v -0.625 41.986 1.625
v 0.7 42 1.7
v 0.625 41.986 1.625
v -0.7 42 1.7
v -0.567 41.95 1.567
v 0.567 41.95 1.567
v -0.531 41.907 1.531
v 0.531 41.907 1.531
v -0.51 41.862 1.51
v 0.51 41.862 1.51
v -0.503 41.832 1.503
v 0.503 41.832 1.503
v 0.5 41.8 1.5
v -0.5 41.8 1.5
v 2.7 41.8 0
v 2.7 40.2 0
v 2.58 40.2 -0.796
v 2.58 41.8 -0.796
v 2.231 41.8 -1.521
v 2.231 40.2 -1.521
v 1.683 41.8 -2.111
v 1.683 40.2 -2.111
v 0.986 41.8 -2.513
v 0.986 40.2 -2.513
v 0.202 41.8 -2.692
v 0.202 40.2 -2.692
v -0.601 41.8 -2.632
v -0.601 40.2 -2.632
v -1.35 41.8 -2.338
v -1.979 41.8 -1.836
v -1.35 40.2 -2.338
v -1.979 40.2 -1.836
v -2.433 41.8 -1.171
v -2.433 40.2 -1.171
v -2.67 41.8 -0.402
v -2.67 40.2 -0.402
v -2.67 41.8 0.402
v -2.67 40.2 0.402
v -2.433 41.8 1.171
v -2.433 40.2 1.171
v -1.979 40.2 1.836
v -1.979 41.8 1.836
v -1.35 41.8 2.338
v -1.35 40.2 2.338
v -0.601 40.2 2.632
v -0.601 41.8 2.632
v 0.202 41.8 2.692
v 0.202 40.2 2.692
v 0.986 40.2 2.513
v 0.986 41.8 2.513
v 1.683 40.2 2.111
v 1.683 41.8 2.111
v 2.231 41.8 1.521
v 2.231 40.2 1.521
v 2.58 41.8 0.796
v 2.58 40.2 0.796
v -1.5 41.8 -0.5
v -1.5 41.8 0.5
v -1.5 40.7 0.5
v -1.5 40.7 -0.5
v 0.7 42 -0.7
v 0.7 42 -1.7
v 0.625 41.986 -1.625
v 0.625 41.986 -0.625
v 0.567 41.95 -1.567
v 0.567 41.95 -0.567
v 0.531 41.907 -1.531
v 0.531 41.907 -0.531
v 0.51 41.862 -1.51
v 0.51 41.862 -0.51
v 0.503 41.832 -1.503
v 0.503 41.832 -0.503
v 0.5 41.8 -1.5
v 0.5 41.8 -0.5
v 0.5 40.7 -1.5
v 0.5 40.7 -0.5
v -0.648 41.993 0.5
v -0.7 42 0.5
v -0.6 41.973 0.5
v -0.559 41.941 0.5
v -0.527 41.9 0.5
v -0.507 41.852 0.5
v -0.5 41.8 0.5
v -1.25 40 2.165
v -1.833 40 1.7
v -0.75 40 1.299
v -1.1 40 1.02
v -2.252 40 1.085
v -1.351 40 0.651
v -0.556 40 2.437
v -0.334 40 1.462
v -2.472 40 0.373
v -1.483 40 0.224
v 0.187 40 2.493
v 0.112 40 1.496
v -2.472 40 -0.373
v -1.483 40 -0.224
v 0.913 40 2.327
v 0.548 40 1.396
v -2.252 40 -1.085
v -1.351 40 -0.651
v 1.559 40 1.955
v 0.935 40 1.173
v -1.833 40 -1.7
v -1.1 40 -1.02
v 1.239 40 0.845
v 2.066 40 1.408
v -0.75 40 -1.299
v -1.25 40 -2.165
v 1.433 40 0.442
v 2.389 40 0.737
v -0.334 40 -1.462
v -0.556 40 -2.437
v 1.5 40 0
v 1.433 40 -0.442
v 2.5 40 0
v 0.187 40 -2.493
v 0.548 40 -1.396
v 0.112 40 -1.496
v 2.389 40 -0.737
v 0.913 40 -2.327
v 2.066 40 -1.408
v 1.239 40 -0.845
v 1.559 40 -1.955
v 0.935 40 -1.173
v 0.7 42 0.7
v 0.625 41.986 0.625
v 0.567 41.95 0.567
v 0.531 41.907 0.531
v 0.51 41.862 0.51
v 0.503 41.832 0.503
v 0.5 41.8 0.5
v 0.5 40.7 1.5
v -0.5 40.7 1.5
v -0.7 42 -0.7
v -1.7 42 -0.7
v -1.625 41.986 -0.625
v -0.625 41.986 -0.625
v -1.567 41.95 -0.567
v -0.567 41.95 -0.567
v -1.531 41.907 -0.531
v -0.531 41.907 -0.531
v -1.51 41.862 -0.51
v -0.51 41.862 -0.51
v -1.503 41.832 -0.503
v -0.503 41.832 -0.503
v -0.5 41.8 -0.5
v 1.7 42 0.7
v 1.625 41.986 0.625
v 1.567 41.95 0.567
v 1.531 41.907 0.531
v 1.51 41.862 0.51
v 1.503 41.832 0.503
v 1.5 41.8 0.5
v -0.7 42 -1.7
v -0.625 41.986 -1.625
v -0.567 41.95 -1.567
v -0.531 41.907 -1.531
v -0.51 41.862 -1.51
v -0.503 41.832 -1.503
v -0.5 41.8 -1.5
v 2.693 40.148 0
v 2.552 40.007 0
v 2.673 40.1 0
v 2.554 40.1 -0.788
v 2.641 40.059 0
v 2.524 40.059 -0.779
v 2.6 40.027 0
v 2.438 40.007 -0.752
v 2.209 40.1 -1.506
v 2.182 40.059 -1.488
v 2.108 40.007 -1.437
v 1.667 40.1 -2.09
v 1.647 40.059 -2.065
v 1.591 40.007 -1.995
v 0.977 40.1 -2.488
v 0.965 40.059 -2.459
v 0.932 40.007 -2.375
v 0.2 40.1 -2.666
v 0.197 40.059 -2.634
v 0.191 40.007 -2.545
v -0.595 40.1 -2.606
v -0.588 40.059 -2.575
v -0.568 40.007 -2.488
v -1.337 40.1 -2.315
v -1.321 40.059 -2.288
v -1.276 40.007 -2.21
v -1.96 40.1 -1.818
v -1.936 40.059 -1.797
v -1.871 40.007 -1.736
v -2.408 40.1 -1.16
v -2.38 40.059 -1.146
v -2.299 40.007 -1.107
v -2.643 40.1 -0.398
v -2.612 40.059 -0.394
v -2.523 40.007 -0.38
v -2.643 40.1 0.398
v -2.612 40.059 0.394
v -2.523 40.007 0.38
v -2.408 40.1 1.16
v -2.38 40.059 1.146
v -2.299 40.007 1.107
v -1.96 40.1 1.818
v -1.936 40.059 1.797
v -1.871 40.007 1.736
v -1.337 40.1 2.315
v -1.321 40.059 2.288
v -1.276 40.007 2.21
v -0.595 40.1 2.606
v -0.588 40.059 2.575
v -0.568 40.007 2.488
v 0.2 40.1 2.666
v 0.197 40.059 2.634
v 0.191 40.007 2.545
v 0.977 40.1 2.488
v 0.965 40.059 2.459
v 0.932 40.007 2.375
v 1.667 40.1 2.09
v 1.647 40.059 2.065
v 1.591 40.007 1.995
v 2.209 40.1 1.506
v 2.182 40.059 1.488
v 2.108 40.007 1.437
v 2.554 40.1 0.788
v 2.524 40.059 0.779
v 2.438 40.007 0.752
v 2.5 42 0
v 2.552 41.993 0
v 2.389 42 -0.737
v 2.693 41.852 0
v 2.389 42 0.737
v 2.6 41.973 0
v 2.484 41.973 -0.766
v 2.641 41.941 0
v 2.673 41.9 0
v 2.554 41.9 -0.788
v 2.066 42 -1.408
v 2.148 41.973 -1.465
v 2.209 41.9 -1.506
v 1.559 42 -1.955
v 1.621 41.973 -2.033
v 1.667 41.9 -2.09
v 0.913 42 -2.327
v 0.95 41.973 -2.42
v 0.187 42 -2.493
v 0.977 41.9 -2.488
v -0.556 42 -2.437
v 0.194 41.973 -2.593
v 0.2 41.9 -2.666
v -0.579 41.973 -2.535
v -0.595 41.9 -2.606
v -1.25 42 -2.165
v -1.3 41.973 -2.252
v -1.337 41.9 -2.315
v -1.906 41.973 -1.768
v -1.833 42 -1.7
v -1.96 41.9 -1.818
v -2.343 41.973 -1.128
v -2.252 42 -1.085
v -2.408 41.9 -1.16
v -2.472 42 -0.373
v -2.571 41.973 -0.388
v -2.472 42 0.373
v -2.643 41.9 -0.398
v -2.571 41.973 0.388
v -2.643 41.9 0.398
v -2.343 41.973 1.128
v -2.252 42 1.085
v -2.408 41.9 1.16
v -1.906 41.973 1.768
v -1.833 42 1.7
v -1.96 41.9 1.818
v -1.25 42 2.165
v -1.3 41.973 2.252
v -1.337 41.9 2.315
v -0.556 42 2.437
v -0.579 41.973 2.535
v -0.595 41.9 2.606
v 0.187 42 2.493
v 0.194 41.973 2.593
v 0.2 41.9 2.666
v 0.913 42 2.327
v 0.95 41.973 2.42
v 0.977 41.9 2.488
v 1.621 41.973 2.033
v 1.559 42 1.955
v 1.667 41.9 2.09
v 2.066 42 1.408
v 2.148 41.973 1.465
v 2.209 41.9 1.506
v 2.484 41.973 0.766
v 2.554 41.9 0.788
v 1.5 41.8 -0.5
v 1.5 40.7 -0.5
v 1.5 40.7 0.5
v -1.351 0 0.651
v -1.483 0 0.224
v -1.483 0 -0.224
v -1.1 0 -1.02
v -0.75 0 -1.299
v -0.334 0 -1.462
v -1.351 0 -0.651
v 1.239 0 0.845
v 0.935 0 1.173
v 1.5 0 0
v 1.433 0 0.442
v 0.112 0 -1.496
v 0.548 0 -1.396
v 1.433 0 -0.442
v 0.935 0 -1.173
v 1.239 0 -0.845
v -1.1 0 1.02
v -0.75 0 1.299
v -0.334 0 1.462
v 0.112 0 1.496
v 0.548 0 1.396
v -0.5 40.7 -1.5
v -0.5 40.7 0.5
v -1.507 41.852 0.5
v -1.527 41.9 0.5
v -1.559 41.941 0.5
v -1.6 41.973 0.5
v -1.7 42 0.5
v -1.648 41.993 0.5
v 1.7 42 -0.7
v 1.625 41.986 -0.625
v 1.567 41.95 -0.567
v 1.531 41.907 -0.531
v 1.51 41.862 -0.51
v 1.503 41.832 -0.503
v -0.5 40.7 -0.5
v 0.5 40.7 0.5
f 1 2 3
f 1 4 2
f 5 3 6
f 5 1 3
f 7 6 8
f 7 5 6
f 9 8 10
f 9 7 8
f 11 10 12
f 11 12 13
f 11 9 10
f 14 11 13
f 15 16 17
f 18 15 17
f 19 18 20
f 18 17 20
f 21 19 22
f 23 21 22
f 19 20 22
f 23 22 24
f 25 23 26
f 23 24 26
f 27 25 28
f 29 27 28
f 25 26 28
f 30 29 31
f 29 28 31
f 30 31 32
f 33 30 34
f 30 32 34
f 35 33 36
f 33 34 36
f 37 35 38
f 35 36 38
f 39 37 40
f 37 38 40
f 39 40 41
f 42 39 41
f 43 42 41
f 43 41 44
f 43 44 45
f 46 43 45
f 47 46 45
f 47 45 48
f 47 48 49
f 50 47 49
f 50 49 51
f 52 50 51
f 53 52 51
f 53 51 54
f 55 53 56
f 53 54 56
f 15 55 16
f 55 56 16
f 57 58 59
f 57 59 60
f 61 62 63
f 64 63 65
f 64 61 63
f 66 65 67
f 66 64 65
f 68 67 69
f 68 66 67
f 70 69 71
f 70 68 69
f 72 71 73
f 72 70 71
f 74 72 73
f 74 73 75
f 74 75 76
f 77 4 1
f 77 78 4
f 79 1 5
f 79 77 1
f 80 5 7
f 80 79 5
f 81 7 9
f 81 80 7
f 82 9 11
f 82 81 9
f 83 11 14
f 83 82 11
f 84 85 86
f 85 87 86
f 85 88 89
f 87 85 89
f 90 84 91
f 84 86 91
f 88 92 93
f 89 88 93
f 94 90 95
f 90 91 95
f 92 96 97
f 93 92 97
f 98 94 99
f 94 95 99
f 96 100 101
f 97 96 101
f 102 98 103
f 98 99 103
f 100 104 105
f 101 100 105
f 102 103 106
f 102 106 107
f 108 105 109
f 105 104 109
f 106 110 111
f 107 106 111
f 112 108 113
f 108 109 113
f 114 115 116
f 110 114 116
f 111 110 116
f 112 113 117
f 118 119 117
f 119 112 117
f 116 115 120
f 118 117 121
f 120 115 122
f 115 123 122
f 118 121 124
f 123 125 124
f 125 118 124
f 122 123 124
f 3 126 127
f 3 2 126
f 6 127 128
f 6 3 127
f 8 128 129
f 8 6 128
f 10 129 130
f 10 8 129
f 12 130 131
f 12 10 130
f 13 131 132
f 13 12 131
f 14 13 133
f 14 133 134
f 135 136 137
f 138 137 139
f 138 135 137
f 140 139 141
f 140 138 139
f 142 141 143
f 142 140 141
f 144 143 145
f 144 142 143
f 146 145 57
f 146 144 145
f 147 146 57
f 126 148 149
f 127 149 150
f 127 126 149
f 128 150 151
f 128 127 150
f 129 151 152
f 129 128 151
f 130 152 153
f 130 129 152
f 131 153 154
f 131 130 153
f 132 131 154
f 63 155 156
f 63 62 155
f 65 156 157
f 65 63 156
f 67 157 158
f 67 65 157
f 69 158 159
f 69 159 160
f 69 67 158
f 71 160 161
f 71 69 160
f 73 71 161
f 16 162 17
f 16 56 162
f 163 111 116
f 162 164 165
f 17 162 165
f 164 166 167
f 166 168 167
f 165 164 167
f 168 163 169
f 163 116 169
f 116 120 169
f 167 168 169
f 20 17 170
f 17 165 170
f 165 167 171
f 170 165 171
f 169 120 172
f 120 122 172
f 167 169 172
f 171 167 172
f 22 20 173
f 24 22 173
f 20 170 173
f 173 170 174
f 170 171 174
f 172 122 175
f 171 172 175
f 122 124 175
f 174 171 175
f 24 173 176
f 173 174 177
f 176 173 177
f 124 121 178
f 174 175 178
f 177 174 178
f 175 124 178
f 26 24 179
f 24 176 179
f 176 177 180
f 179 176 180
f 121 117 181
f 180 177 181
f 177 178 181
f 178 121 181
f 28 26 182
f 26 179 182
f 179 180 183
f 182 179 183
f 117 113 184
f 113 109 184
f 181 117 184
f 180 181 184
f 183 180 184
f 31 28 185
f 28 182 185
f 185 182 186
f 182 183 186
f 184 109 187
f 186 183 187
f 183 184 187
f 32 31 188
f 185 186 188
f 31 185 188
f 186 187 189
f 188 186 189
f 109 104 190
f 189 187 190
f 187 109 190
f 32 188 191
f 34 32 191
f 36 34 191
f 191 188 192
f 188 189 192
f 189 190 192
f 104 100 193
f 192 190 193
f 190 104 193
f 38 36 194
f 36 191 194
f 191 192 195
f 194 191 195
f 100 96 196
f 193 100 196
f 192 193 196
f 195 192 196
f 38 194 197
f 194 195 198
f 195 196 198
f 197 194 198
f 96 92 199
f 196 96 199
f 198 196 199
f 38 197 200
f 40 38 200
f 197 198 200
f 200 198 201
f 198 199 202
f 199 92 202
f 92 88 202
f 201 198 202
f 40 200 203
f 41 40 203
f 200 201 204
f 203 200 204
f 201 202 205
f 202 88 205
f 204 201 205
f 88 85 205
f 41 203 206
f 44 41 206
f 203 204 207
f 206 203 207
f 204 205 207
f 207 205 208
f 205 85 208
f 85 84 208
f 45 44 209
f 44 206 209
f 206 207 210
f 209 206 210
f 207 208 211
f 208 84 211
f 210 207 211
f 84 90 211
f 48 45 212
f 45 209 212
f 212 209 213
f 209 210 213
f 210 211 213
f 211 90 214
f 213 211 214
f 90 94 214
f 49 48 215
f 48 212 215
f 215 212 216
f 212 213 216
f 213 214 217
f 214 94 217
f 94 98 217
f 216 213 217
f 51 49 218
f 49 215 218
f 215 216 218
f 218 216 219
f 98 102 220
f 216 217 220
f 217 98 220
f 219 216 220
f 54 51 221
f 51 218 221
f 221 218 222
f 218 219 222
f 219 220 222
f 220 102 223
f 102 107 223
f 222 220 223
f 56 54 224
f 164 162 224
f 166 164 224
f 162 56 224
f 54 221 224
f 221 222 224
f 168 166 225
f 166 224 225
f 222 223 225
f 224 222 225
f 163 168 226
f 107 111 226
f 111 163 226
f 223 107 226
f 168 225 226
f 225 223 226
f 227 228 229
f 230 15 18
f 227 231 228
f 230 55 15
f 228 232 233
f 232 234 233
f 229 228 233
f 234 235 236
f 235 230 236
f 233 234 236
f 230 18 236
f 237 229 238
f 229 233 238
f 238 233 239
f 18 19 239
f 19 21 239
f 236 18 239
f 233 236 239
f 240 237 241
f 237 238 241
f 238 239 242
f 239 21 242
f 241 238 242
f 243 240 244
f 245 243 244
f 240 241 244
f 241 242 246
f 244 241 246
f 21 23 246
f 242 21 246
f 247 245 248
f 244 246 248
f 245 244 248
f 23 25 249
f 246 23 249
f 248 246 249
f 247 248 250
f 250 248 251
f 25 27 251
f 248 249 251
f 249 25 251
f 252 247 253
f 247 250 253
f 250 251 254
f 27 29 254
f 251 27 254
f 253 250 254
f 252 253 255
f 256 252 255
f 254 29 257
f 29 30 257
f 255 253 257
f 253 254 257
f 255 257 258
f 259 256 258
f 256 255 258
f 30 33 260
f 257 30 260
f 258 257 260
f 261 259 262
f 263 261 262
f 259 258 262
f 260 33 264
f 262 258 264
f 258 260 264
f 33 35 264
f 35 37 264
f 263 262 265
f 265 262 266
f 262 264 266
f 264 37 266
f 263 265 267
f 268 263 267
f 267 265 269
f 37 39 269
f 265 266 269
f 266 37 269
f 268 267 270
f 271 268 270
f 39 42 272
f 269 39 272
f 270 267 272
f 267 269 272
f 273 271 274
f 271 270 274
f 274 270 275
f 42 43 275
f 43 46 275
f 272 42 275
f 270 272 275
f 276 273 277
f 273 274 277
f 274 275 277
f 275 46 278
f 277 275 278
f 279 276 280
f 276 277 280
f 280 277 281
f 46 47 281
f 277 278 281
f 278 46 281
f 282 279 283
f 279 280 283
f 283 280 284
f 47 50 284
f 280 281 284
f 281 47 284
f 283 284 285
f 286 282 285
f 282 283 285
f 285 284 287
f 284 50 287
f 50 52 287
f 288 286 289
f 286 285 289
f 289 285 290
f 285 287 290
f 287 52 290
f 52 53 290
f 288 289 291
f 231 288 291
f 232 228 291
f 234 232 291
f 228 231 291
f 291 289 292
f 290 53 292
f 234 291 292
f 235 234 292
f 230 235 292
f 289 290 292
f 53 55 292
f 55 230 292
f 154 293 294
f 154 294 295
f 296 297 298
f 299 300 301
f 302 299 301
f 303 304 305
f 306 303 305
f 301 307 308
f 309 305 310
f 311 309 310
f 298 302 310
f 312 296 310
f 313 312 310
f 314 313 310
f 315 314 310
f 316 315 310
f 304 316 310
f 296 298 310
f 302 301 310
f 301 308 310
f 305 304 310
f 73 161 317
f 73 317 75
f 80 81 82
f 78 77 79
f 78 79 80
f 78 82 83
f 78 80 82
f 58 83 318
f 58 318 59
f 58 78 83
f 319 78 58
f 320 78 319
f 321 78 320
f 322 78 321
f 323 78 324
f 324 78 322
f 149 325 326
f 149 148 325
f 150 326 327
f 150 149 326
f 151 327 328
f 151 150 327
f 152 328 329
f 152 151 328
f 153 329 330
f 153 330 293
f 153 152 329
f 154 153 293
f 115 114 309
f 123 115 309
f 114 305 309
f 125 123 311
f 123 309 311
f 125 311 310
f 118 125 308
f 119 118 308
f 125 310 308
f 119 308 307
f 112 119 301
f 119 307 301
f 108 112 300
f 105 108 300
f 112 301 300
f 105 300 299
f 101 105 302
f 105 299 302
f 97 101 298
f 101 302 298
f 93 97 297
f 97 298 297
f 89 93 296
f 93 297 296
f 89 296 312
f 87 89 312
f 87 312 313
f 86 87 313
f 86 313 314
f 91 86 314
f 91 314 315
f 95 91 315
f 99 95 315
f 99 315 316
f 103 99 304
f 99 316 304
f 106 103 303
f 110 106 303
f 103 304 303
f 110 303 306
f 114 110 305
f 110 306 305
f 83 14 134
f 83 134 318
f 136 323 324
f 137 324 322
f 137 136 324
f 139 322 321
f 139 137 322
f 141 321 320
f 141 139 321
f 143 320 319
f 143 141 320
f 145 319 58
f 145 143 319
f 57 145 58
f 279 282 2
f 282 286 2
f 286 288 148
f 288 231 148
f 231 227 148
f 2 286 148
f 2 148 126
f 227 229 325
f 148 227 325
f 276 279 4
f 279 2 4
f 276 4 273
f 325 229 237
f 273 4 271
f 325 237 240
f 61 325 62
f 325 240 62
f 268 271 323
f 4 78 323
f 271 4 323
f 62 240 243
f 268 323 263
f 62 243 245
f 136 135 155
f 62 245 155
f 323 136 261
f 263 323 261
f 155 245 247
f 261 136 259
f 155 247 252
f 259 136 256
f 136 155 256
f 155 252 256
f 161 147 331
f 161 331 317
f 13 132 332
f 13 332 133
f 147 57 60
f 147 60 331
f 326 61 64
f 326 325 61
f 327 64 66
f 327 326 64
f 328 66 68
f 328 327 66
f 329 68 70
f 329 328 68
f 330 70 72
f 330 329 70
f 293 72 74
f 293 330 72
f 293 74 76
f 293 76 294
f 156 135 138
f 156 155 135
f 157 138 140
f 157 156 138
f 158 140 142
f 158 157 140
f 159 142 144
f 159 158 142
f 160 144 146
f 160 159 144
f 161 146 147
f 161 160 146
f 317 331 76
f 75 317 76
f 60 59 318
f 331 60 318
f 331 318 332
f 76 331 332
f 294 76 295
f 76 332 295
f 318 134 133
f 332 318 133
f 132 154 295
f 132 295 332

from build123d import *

# Parameters (mm, degrees)
FILLET_R     = 0.2
POCKET_DEPTH = 1.3
FILLET001_R  = 0.2


with BuildPart() as part:
    # Sketch → Revolution (revolve)
    with BuildSketch(Plane.XY):
        Polygon((0, 0), (0, 42), (2.7, 42), (2.7, 40), (1.5, 40), (1.5, 0), align=None)
    revolve(axis=Axis((0, 0, 0), (0, 1, 0)))

    # Fillet
    fillet_edges = [part.edges().sort_by_distance(p)[0] for p in [
        (-2.7, 40, 0),
        (-2.7, 42, 0),
    ]]
    fillet(fillet_edges, radius=FILLET_R)

    # Sketch001 (on Face1 of Fillet) → Pocket (cut)
    with BuildSketch(Plane(origin=(0, 42, 0), x_dir=(-1, 0, 0), z_dir=(0, 1, 0))):
        Polygon((0.5, 1.5), (0.5, 0.5), (1.5, 0.5), (1.5, -0.5), (0.5, -0.5), (0.5, -1.5), (-0.5, -1.5), (-0.5, -0.5), (-1.5, -0.5), (-1.5, 0.5), (-0.5, 0.5), (-0.5, 1.5), align=None)
    extrude(amount=-POCKET_DEPTH, mode=Mode.SUBTRACT)

    # Fillet001
    fillet001_edges = [part.edges().sort_by_distance(p)[0] for p in [
        (0, 42, -1.5),
        (0.5, 42, -1),
        (1, 42, -0.5),
        (1.5, 42, 0),
        (1, 42, 0.5),
        (0.5, 42, 1),
        (-0.5, 42, 1),
        (0, 42, 1.5),
        (-1.5, 42, 0),
        (-1, 42, -0.5),
        (-0.5, 42, -1),
    ]]
    fillet(fillet001_edges, radius=FILLET001_R)


solid = part.part
